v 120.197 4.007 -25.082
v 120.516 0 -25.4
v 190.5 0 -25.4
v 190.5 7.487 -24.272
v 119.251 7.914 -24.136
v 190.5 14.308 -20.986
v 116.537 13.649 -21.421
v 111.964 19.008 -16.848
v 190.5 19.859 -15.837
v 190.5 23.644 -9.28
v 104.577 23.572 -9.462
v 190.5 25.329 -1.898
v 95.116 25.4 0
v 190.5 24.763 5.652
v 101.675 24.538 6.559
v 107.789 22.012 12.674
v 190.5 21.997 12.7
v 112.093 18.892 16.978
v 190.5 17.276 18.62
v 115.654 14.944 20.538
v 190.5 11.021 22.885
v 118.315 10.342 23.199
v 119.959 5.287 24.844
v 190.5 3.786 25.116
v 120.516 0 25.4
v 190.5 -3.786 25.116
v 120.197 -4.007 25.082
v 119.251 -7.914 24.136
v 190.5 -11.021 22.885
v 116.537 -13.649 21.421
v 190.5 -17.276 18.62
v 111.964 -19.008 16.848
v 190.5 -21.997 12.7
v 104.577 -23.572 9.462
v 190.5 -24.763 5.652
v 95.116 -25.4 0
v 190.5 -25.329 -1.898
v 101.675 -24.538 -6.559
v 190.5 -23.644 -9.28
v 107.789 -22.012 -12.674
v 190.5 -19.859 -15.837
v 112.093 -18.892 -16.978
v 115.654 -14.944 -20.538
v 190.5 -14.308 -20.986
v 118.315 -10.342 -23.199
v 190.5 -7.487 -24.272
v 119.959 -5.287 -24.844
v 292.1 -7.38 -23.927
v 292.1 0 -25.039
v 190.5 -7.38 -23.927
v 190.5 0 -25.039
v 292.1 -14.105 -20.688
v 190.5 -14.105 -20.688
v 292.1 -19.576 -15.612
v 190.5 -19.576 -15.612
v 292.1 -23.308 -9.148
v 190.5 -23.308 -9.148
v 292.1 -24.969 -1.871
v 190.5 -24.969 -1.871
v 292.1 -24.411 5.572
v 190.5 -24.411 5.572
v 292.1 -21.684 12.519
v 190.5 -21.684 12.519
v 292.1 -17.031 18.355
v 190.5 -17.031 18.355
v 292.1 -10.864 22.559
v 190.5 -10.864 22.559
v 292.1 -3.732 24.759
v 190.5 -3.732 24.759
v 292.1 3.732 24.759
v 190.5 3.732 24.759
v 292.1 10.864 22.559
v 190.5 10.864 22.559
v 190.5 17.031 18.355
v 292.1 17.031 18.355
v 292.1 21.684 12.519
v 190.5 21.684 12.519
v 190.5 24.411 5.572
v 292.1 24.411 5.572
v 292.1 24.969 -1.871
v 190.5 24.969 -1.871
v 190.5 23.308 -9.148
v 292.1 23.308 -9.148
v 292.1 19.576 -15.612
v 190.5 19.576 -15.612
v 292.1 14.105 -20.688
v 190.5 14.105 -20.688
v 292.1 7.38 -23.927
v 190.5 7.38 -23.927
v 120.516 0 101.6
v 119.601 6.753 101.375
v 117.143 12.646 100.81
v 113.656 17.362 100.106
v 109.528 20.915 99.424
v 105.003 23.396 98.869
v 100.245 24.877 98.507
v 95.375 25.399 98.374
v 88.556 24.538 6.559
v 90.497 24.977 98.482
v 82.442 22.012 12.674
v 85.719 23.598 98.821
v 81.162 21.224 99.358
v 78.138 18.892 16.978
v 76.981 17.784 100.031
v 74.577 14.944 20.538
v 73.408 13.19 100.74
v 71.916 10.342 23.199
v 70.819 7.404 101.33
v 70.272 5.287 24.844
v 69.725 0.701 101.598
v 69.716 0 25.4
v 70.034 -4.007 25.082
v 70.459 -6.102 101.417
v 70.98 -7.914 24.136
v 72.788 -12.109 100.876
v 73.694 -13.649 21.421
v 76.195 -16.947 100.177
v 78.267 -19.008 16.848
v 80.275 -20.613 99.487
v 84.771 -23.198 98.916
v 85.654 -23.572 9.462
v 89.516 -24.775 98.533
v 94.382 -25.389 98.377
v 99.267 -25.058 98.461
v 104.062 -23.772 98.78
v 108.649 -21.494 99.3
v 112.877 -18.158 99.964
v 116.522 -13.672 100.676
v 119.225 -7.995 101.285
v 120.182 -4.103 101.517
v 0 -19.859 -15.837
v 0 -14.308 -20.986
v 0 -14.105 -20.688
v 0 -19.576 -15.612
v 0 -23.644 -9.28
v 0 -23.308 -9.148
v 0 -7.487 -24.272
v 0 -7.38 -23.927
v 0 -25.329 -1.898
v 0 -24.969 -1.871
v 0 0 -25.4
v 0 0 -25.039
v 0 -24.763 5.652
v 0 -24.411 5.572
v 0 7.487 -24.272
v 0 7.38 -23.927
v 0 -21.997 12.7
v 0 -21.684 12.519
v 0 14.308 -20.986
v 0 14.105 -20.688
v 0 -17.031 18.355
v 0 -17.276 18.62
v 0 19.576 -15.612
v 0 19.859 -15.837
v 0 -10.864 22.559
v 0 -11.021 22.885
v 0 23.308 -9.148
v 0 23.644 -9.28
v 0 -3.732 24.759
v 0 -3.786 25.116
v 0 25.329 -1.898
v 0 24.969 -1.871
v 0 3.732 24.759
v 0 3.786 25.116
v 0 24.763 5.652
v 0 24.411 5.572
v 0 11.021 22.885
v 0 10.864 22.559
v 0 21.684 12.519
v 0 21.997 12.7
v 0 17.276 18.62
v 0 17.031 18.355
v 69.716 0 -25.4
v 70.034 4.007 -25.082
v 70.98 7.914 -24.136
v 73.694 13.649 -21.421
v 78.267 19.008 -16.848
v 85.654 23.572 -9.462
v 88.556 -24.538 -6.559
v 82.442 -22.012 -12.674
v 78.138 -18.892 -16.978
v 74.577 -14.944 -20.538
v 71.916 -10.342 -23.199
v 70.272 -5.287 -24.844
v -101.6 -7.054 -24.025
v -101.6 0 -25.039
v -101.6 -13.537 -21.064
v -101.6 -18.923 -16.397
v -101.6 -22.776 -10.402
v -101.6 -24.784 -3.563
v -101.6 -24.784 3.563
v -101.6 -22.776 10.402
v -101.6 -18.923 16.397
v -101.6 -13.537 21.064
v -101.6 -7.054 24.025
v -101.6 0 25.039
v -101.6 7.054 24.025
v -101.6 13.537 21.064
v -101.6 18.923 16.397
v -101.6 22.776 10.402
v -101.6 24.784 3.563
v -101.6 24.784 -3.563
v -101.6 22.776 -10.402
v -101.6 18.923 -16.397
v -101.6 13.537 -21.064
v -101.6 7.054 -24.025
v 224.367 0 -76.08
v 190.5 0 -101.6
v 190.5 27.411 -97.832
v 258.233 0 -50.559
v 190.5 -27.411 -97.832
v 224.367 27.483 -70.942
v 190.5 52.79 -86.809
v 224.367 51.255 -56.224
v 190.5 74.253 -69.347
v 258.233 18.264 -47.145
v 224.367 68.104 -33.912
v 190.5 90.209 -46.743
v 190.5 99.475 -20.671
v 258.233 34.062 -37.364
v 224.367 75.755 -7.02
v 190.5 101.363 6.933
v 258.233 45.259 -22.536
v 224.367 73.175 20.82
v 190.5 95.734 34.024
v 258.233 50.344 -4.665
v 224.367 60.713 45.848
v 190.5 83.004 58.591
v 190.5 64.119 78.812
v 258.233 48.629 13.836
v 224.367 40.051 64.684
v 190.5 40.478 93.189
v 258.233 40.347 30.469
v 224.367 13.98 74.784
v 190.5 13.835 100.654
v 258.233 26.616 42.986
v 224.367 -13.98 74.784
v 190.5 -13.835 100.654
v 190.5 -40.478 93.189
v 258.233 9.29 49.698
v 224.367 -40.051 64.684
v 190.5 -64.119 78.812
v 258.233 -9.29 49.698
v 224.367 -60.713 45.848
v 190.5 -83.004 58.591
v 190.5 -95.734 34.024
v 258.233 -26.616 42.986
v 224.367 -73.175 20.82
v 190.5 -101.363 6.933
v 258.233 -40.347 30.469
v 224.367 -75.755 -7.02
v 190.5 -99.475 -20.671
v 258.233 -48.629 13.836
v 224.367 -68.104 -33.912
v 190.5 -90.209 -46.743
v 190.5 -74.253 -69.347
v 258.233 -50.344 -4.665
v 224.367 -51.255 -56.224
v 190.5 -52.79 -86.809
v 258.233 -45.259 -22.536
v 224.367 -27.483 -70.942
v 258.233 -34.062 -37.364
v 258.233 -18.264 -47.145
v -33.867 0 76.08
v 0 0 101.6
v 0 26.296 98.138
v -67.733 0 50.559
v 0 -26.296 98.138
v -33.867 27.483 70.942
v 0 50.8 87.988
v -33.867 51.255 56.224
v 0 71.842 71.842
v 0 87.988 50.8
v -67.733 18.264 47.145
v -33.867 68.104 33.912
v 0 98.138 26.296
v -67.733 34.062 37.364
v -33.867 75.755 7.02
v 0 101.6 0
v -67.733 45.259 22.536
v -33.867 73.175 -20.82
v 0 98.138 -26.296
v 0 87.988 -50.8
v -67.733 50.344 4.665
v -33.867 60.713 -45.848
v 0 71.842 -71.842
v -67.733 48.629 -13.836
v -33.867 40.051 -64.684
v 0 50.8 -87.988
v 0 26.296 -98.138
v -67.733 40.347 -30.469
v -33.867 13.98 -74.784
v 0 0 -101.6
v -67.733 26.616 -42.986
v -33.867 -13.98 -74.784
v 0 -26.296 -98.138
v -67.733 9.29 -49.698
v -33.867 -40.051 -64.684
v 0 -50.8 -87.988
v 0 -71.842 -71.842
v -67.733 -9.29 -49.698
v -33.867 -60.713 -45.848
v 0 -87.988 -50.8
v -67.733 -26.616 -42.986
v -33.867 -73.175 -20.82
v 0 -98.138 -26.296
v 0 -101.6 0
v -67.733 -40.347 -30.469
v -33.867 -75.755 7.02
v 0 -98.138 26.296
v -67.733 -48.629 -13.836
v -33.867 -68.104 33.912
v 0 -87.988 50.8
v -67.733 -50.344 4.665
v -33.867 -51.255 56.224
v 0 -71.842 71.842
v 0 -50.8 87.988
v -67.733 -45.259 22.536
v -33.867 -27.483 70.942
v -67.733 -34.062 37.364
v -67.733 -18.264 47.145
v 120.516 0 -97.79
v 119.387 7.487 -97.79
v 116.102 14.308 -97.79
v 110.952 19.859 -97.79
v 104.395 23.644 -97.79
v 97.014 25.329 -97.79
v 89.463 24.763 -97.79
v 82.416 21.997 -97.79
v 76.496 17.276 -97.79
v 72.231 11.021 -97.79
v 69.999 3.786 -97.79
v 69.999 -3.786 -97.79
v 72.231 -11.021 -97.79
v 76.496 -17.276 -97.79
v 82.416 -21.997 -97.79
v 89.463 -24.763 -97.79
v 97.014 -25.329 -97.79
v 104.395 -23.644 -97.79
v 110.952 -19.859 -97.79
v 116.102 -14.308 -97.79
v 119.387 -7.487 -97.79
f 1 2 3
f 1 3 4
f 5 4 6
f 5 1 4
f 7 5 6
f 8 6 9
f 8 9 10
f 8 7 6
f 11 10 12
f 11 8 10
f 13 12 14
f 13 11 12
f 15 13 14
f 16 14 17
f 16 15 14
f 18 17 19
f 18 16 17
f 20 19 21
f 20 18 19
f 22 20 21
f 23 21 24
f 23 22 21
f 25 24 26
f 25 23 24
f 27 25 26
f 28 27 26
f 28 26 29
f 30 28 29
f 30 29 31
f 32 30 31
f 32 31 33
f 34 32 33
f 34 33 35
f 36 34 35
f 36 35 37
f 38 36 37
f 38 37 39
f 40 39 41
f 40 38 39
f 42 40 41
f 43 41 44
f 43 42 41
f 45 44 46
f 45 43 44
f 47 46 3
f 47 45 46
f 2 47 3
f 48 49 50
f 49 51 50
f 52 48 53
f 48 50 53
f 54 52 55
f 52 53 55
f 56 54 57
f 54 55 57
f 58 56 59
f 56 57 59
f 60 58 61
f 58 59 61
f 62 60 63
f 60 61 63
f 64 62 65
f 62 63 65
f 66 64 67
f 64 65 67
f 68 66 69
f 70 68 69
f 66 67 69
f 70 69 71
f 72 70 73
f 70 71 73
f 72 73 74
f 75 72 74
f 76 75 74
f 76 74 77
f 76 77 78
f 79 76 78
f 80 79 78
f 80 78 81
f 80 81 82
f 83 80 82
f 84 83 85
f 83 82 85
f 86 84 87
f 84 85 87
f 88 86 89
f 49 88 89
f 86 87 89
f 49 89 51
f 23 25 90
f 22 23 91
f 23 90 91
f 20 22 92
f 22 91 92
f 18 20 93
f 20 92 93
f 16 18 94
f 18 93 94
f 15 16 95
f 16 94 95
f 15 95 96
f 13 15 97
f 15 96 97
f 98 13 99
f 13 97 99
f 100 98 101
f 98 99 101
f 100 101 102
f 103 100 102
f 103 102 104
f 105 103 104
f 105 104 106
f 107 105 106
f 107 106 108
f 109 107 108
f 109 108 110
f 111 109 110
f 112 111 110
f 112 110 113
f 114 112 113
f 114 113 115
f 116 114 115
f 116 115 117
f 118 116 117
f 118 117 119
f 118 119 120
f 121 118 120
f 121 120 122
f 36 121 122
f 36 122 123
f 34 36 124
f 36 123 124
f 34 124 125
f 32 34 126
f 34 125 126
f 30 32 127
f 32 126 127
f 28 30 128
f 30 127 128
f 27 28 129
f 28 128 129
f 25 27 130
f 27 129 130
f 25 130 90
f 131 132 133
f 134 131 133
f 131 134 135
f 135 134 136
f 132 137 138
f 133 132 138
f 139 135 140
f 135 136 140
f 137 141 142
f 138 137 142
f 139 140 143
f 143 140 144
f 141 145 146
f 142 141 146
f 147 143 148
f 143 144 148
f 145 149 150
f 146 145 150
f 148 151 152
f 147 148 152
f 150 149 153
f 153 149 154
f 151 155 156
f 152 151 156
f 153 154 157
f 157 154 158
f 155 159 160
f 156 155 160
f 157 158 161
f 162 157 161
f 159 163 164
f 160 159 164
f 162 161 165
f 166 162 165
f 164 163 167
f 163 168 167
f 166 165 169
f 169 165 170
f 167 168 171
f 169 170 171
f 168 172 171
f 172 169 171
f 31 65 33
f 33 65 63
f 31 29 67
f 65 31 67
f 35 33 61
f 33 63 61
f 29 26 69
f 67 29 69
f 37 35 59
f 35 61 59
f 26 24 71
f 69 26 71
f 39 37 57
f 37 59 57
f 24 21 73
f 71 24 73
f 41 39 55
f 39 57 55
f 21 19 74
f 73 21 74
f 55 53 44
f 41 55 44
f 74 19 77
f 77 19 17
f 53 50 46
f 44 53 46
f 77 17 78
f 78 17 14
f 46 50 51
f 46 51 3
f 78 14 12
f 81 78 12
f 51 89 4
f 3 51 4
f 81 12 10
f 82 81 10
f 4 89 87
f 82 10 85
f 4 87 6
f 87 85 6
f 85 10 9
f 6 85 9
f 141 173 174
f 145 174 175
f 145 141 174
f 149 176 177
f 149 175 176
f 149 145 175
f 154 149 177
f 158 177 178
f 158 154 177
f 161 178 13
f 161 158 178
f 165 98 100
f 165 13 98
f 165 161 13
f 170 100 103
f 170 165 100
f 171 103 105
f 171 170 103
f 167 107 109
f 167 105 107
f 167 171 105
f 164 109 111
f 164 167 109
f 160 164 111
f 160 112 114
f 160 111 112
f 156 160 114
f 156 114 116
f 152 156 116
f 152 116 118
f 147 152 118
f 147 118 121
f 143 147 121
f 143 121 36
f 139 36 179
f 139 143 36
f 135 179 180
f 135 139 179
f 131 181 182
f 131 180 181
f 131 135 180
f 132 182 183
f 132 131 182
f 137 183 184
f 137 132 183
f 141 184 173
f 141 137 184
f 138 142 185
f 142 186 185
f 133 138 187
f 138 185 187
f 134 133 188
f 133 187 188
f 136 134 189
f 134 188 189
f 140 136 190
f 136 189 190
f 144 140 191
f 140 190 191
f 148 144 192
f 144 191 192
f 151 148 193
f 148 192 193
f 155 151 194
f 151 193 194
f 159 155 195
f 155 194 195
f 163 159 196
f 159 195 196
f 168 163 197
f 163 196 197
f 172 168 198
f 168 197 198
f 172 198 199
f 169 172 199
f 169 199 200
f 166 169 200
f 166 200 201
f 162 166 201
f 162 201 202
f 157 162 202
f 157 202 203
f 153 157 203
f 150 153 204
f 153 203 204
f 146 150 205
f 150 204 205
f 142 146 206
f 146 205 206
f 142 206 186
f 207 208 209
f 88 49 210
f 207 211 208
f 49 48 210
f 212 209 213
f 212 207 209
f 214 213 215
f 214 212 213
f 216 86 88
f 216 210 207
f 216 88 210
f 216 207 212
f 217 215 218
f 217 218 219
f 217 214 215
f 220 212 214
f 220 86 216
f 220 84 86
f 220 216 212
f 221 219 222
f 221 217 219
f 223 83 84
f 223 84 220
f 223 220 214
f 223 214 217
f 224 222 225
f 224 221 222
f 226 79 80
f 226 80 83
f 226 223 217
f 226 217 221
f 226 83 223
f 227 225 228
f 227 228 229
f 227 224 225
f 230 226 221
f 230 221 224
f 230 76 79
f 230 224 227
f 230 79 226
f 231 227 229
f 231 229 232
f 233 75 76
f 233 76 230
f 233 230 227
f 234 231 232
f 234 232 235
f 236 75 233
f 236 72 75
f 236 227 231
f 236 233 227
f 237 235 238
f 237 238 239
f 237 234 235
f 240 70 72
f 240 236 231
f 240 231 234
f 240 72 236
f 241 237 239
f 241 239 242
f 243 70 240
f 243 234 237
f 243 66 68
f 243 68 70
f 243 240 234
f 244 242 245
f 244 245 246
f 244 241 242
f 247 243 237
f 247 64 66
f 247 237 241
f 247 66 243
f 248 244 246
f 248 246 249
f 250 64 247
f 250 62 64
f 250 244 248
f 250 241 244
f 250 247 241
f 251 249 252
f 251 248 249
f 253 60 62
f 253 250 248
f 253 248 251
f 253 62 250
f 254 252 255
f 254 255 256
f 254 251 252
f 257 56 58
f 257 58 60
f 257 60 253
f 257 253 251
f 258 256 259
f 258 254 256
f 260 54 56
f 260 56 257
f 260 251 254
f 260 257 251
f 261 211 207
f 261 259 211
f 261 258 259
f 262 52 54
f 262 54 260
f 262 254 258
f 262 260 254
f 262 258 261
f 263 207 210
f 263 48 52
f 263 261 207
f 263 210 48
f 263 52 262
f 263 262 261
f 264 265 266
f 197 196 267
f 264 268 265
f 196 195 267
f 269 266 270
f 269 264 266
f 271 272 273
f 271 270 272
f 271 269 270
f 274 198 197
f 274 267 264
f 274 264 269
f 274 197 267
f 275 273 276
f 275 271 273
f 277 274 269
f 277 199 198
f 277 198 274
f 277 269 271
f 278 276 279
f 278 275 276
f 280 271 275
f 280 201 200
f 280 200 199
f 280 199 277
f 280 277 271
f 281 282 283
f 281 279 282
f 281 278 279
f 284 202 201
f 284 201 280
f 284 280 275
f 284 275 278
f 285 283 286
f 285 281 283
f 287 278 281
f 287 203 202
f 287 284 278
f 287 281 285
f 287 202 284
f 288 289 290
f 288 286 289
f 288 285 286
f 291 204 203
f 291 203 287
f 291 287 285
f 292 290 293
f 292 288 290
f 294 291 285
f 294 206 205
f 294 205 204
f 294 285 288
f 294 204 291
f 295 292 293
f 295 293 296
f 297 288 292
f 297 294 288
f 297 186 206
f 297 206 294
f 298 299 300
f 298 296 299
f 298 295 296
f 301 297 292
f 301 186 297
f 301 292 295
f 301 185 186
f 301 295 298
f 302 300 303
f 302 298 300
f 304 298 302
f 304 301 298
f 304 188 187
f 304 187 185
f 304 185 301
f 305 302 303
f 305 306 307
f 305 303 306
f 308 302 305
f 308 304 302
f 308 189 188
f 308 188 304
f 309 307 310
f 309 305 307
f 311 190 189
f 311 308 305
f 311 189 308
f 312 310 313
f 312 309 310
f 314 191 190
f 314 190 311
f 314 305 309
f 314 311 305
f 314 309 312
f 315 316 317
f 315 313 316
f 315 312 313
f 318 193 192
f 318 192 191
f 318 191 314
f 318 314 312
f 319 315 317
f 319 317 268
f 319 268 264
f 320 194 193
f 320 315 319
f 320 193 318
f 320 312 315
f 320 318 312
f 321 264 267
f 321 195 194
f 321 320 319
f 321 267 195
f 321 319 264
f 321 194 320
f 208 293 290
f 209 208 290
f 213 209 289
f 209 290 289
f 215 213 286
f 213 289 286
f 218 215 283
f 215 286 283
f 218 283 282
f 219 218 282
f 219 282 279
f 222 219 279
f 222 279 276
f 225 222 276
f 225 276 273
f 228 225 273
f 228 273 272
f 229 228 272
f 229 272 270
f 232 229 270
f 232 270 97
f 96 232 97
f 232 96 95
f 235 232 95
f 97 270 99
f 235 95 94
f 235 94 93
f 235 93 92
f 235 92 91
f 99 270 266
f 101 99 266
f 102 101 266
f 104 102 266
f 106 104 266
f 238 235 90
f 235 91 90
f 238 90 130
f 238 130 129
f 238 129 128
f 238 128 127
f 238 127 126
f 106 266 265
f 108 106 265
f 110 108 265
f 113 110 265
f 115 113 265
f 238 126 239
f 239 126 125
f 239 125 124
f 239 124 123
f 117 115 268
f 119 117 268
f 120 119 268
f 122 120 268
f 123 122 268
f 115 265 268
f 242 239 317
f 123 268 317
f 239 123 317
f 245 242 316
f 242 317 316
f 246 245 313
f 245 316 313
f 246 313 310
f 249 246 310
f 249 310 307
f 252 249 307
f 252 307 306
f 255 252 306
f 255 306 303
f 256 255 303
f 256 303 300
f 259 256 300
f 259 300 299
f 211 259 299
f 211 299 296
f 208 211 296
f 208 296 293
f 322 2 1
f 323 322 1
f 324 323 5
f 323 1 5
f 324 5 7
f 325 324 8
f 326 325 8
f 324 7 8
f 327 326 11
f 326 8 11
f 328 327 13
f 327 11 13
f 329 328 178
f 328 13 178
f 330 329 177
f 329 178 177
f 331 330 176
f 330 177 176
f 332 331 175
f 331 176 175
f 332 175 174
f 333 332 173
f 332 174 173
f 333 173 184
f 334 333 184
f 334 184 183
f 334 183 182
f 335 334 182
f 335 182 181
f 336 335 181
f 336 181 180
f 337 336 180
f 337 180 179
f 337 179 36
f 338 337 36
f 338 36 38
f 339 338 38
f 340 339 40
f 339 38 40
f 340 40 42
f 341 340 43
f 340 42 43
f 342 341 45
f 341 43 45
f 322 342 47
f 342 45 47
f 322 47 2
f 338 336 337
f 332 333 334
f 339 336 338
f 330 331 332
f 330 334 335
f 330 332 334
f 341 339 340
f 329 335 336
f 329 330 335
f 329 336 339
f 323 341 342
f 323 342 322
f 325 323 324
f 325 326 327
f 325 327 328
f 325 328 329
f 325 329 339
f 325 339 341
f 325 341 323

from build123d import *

# Parameters (mm, degrees)
SKETCH1_R           = 101.6
SKETCH1_R_2         = 25.4
BOSS_EXTRUDE1_DEPTH = 190.5
SKETCH2_R           = 101.6
BOSS_EXTRUDE2_DEPTH = 101.6
BOSS_EXTRUDE2_TAPER = 37
SKETCH3_R           = 101.6
BOSS_EXTRUDE3_DEPTH = 101.6
BOSS_EXTRUDE3_TAPER = 37
SKETCH4_R           = 25.03890851
CUT_EXTRUDE1_DEPTH  = 453.39
SKETCH5_R           = 25.4
CUT_EXTRUDE3_DEPTH  = 351.79


with BuildPart() as part:
    # Sketch1 → Boss-Extrude1 (new body)
    with BuildSketch(Plane(origin=(0, 0, 0), x_dir=(0, 0, -1), z_dir=(1, 0, 0))):
        Circle(SKETCH1_R)
        Circle(SKETCH1_R_2, mode=Mode.SUBTRACT)
    extrude(amount=BOSS_EXTRUDE1_DEPTH)

    # Sketch2 → Boss-Extrude2 (add)
    with BuildSketch(Plane(origin=(190.5, 0, 0), x_dir=(0, 0, -1), z_dir=(1, 0, 0))):
        Circle(SKETCH2_R)
    extrude(amount=BOSS_EXTRUDE2_DEPTH, taper=BOSS_EXTRUDE2_TAPER)

    # Sketch3 → Boss-Extrude3 (add)
    with BuildSketch(Plane.ZY):
        Circle(SKETCH3_R)
    extrude(amount=BOSS_EXTRUDE3_DEPTH, taper=BOSS_EXTRUDE3_TAPER)

    # Sketch4 → Cut-Extrude1 (cut)
    with BuildSketch(Plane.ZY.offset(101.6)):
        with Locations(Location((0, 0, 0), (0, 0, 180))):
            Circle(SKETCH4_R)
    extrude(amount=-CUT_EXTRUDE1_DEPTH, mode=Mode.SUBTRACT)

    # Sketch5 → Cut-Extrude3 (cut)
    with BuildSketch(Plane.XY.offset(254)):
        with Locations((95.115505382, 0)):
            Circle(SKETCH5_R)
    extrude(amount=-CUT_EXTRUDE3_DEPTH, mode=Mode.SUBTRACT)


solid = part.part
